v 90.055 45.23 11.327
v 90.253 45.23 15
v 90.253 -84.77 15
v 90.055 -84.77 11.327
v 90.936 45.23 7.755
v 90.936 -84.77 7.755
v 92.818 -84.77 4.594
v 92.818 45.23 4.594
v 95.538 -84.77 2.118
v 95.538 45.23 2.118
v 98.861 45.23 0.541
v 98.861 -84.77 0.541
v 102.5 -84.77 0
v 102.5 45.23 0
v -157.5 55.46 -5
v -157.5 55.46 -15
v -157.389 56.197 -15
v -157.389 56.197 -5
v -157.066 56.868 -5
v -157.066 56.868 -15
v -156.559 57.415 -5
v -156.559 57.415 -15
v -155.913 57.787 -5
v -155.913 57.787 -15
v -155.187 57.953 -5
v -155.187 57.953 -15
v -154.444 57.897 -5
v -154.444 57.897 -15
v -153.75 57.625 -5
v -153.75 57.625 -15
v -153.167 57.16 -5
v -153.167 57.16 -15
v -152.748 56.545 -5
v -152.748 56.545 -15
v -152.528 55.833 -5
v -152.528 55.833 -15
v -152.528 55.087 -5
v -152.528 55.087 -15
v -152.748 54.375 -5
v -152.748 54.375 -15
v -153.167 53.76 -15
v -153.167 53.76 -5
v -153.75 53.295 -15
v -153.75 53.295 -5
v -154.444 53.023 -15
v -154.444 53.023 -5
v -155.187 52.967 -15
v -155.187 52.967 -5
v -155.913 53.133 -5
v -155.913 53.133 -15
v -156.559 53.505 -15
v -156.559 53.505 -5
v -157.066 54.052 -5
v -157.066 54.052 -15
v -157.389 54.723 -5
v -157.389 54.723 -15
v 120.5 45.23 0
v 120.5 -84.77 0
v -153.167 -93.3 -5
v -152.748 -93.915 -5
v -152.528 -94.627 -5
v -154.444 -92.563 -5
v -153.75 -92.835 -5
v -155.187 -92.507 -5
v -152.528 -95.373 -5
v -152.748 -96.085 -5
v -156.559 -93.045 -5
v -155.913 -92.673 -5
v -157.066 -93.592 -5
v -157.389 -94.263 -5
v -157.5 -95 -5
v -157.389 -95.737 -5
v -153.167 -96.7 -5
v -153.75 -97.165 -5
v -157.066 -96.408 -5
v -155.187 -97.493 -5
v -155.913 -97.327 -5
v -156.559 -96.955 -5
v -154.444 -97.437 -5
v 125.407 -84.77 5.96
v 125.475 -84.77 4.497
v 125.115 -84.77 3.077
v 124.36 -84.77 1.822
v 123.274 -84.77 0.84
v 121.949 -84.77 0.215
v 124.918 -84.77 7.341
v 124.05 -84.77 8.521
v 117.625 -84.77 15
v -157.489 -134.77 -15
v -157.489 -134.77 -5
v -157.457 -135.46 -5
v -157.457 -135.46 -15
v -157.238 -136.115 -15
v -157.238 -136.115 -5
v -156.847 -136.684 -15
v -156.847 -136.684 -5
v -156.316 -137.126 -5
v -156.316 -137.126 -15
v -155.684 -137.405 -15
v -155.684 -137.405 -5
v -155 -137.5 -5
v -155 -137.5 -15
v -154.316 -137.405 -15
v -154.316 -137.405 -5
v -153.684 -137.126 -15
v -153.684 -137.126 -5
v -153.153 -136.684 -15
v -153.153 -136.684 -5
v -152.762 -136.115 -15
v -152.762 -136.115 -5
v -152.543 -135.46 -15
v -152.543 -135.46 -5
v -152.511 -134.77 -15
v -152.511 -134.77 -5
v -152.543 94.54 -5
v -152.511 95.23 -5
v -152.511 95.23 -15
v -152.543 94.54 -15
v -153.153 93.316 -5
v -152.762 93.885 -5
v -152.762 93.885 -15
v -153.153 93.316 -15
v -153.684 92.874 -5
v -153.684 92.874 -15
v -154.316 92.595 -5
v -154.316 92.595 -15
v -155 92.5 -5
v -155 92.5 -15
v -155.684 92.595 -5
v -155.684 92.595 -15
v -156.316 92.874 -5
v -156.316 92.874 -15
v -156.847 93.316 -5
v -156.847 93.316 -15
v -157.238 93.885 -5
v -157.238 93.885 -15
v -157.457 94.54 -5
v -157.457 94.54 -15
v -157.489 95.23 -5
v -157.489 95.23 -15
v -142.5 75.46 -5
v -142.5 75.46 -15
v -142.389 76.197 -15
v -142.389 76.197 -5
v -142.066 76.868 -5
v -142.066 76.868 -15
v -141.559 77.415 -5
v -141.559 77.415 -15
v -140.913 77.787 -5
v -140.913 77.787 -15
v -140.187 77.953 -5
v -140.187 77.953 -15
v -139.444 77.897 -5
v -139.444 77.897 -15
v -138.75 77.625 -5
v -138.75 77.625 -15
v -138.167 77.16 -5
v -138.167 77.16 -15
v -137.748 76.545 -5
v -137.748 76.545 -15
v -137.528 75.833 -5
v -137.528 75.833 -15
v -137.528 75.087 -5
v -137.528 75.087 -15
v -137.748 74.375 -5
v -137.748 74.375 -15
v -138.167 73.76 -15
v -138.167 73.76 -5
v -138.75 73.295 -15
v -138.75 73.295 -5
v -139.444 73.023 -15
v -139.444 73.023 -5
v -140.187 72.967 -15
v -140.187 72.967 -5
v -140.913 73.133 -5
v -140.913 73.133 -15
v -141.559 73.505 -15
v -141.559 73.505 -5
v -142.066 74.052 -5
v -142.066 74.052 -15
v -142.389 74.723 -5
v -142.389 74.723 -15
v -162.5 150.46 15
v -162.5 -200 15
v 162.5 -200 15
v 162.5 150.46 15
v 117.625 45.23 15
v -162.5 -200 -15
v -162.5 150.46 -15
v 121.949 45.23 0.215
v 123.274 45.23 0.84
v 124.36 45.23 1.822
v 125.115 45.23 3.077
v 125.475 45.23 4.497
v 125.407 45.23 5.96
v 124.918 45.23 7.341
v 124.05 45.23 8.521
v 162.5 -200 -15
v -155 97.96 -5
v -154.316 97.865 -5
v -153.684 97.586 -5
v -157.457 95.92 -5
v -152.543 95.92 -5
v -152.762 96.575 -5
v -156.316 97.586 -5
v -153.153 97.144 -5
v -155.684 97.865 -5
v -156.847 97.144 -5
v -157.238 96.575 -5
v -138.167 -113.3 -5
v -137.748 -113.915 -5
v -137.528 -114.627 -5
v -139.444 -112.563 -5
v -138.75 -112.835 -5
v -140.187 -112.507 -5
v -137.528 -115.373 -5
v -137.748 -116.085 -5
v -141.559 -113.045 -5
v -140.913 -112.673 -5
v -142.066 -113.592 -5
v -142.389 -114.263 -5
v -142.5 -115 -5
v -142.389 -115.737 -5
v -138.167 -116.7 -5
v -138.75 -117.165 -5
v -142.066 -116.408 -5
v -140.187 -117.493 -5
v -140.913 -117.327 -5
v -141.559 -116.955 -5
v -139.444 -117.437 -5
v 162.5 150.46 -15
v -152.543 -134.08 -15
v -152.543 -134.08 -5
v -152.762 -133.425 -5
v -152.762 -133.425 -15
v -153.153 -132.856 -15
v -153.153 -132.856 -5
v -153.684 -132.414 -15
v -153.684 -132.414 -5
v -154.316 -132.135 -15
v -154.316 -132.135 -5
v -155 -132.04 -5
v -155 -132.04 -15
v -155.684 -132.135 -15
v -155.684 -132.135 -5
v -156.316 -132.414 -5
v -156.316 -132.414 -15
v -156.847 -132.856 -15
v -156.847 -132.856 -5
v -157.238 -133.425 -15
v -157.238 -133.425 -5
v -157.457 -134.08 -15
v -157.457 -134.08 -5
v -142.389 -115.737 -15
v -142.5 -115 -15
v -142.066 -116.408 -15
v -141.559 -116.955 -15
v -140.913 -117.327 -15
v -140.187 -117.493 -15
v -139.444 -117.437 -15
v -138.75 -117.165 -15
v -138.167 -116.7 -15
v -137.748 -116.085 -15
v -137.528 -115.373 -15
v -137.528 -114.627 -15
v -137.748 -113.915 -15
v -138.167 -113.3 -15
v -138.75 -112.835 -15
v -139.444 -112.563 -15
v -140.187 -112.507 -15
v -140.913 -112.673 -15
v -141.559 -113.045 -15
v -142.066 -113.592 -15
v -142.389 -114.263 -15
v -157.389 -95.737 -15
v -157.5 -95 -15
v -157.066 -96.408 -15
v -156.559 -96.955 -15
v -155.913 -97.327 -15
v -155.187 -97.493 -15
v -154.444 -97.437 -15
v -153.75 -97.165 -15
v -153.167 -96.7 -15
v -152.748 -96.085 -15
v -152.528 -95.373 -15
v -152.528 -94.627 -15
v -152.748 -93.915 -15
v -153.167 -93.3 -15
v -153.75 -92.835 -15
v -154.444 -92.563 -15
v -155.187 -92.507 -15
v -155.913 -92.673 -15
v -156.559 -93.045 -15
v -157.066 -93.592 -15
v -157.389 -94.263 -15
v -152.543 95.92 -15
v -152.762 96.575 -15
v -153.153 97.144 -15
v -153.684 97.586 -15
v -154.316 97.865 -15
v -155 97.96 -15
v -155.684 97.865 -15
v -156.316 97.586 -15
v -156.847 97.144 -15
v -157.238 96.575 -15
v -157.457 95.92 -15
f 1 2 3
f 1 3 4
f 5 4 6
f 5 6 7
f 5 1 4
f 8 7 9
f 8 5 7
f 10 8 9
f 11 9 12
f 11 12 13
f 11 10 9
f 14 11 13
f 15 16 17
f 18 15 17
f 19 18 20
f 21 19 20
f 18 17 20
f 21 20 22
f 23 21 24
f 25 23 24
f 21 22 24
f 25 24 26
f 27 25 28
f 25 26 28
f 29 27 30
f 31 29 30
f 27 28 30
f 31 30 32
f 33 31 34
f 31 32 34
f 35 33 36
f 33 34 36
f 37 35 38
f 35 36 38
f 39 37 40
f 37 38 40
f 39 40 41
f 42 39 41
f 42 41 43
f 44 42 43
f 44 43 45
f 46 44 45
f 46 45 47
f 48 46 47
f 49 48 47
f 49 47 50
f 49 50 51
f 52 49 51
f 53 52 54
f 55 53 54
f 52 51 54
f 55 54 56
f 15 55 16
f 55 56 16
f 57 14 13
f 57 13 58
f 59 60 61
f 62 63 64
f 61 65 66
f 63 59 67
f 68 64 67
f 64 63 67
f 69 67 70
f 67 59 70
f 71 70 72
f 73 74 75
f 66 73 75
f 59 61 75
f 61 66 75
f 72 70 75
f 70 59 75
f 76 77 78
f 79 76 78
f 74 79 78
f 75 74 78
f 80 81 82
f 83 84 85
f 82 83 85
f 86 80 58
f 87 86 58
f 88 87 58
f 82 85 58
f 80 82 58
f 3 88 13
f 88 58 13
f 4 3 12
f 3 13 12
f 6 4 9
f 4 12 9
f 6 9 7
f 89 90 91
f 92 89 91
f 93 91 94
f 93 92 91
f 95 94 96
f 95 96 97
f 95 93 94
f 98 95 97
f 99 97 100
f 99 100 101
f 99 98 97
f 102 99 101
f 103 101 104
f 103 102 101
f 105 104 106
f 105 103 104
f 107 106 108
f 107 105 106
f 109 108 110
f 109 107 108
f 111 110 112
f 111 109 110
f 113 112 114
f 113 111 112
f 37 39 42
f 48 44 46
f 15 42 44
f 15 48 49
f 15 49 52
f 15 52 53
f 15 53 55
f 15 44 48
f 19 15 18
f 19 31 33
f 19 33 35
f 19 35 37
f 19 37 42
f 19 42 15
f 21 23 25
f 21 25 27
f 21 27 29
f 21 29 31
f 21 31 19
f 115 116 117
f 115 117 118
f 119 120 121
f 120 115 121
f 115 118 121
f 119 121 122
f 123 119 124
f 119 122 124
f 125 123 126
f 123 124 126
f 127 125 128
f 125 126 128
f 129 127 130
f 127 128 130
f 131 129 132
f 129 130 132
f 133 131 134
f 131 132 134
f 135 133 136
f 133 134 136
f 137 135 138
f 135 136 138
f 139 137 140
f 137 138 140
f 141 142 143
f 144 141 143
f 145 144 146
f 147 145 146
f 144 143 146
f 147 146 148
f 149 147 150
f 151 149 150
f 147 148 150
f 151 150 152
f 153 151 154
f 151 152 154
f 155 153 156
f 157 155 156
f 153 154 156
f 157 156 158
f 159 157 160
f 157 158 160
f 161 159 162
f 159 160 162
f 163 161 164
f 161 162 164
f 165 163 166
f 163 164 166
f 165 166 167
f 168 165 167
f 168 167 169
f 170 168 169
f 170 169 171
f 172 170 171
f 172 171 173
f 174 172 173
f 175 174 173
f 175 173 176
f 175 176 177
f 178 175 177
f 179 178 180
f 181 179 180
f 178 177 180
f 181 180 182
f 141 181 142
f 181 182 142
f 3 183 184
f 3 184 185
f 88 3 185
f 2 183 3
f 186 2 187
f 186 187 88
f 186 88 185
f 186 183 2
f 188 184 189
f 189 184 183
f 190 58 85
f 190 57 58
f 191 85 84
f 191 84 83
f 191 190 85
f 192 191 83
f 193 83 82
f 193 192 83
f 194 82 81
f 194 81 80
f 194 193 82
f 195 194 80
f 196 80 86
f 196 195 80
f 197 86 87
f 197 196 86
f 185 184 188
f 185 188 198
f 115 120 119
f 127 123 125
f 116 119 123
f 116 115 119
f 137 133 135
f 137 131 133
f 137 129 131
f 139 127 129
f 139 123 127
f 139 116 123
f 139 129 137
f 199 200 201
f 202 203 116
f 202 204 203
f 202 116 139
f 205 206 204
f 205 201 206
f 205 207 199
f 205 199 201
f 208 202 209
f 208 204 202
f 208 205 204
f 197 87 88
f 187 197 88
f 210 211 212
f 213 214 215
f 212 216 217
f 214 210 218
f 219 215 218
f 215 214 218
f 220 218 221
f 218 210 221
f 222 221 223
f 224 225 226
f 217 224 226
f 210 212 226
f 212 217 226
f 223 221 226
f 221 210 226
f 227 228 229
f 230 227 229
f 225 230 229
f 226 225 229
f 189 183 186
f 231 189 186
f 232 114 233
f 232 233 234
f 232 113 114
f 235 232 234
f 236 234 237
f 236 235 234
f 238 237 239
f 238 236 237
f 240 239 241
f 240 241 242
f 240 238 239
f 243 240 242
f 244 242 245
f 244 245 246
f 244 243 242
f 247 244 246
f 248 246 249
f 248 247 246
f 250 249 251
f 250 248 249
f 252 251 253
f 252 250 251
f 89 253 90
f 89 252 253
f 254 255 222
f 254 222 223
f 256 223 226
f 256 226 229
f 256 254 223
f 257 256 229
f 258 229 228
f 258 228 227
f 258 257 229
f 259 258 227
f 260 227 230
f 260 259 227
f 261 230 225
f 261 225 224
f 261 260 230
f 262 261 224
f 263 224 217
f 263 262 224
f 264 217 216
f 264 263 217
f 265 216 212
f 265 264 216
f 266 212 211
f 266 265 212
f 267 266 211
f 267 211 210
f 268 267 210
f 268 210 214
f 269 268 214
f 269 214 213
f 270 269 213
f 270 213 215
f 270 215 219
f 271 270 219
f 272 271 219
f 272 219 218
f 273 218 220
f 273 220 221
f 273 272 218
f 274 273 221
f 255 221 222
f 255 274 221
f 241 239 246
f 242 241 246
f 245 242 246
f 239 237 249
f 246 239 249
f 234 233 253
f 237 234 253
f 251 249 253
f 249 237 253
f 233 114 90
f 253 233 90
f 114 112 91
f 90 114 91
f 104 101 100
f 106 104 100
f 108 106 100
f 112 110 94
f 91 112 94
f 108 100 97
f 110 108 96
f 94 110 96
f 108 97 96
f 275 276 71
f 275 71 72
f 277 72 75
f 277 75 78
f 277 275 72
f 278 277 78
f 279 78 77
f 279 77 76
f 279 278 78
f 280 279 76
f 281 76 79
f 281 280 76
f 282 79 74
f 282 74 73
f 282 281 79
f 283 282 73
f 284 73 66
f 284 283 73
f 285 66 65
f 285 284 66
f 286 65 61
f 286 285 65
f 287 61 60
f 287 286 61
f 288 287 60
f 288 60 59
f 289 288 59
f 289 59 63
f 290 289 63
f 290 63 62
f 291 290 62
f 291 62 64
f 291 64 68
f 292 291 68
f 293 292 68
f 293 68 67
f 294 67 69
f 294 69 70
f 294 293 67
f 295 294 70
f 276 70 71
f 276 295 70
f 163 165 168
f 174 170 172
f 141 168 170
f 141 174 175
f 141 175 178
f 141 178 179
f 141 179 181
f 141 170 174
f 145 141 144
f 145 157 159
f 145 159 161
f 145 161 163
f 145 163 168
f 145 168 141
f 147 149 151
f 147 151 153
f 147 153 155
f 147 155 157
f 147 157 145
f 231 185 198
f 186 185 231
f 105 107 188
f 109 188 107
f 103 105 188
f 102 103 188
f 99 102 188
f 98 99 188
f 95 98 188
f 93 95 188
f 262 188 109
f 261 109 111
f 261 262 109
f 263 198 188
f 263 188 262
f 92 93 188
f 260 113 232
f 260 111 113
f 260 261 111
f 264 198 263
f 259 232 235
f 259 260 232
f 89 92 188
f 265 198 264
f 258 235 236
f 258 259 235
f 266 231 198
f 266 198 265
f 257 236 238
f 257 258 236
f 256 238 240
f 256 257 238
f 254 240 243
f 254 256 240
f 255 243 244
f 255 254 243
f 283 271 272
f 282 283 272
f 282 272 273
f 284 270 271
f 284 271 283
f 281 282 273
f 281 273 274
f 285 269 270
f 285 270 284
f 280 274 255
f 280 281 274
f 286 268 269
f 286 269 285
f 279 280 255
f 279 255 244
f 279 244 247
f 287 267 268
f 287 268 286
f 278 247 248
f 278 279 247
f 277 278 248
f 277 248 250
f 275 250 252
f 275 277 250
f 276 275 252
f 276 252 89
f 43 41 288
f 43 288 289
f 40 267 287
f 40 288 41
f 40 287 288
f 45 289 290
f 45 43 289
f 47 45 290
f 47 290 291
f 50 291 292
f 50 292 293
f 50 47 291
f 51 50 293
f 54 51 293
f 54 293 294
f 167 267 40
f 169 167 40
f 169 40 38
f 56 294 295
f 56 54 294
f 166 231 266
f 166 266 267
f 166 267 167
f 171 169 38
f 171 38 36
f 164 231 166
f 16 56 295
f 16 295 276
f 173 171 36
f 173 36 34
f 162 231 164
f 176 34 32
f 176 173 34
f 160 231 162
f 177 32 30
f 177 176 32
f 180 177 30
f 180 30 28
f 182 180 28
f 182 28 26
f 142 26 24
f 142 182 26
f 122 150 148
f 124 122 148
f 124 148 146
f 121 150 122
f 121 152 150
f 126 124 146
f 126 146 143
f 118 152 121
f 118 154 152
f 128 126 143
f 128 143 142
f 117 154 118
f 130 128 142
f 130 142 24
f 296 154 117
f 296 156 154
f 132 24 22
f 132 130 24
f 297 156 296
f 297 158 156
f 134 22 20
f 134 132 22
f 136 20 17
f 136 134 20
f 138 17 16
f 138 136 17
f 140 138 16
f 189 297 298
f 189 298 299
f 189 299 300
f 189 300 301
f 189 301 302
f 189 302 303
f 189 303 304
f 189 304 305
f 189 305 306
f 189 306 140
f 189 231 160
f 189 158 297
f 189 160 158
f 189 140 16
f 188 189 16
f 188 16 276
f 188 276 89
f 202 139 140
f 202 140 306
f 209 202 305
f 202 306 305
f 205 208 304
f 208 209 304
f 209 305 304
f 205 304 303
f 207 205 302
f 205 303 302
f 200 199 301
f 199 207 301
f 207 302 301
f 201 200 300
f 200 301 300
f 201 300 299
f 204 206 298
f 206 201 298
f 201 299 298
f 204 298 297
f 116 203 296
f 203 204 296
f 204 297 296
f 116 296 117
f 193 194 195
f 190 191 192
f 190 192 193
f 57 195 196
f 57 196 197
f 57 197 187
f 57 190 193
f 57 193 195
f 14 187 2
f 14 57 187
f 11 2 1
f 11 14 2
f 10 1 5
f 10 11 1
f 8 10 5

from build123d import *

# Parameters (mm, degrees)
SKETCH1_W               = 325
SKETCH1_H               = 400
BOSS_EXTRUDE1_DEPTH     = 15
SKETCH2_R               = 2.5
CUT_EXTRUDE1_DEPTH      = 10
SKETCH4_W               = 328.47257144
SKETCH4_H               = 49.54
CUT_EXTRUDE3_DEPTH      = 260.434481132
CUT_EXTRUDE4_DEPTH      = 65
MIRROR2_COPY_1_SKETCH_R = 2.5
MIRROR2_COPY_1_DEPTH    = 10
BOSS_EXTRUDE4_REACH     = 261.434
SKETCH6_R               = 2.5


with BuildPart() as part:
    # Sketch1 → Boss-Extrude1 (new, symmetric)
    with BuildSketch(Plane.XY):
        Rectangle(SKETCH1_W, SKETCH1_H)
    extrude(amount=BOSS_EXTRUDE1_DEPTH, both=True)

    # Sketch2 → Cut-Extrude1 (cut)
    with BuildSketch(Plane(origin=(0, 0, -15), x_dir=(-1, 0, 0), z_dir=(0, 0, -1))):
        with Locations((155, 135)):
            Circle(SKETCH2_R)
        with Locations((140, 115)):
            Circle(SKETCH2_R)
        with Locations((155, 95)):
            Circle(SKETCH2_R)
    cut_extrude1 = extrude(amount=-CUT_EXTRUDE1_DEPTH, mode=Mode.SUBTRACT)

    # Mirror1: Cut-Extrude1 across plane
    add(cut_extrude1.mirror(Plane.ZX), mode=Mode.SUBTRACT)

    # Sketch4 → Cut-Extrude3 (cut, through all)
    with BuildSketch(Plane.XY.offset(15)):
        with Locations((1.73628572, 175.23)):
            Rectangle(SKETCH4_W, SKETCH4_H)
    extrude(amount=-CUT_EXTRUDE3_DEPTH, mode=Mode.SUBTRACT)

    # Sketch5 → Cut-Extrude4 (cut, symmetric)
    with BuildSketch(Plane(origin=(0, -19.77, 0), x_dir=(1, 0, 0), z_dir=(0, 1, 0))):
        with BuildLine():
            Line((102.5, 0), (120.5, 0))
            ThreePointArc((120.5, 0), (125.115384615, -3.076923077), (124.050295858, -8.520710059))
            Line((124.050295858, -8.520710059), (111.375739645, -21.301775148))
            ThreePointArc((111.375739645, -21.301775148), (90.961538462, -17.307692308), (102.5, 0))
        make_face()
    extrude(amount=CUT_EXTRUDE4_DEPTH, both=True, mode=Mode.SUBTRACT)

    # Mirror2: Cut-Extrude1 across plane
    add(cut_extrude1.mirror(Plane.ZX.offset(-19.77)), mode=Mode.SUBTRACT)

    # Mirror2 copy 1 sketch → Mirror2 copy 1 (cut)
    with BuildSketch(Plane(origin=(0, -39.54, -15), x_dir=(-1, 0, 0), z_dir=(0, 0, -1))):
        with Locations((155, 135)):
            Circle(MIRROR2_COPY_1_SKETCH_R)
        with Locations((140, 115)):
            Circle(MIRROR2_COPY_1_SKETCH_R)
        with Locations((155, 95)):
            Circle(MIRROR2_COPY_1_SKETCH_R)
    extrude(amount=-MIRROR2_COPY_1_DEPTH, mode=Mode.SUBTRACT)

    # Sketch6 → Boss-Extrude4 (add, up to next)
    with BuildSketch(Plane(origin=(0, 0, -15), x_dir=(-1, 0, 0), z_dir=(0, 0, -1)), mode=Mode.PRIVATE) as boss_extrude4_sk1:
        with Locations((140, 115)):
            Circle(SKETCH6_R)
    boss_extrude4_tool1 = extrude(boss_extrude4_sk1.sketch, amount=-BOSS_EXTRUDE4_REACH, mode=Mode.PRIVATE) - part.part
    # Sketch6 → Boss-Extrude4 (add, up to next)
    with BuildSketch(Plane(origin=(0, 0, -15), x_dir=(-1, 0, 0), z_dir=(0, 0, -1)), mode=Mode.PRIVATE) as boss_extrude4_sk2:
        with Locations((155, 135)):
            Circle(SKETCH6_R)
    boss_extrude4_tool2 = extrude(boss_extrude4_sk2.sketch, amount=-BOSS_EXTRUDE4_REACH, mode=Mode.PRIVATE) - part.part
    # Sketch6 → Boss-Extrude4 (add, up to next)
    with BuildSketch(Plane(origin=(0, 0, -15), x_dir=(-1, 0, 0), z_dir=(0, 0, -1)), mode=Mode.PRIVATE) as boss_extrude4_sk3:
        with Locations((140, -154.54)):
            Circle(SKETCH6_R)
    boss_extrude4_tool3 = extrude(boss_extrude4_sk3.sketch, amount=-BOSS_EXTRUDE4_REACH, mode=Mode.PRIVATE) - part.part
    # Sketch6 → Boss-Extrude4 (add, up to next)
    with BuildSketch(Plane(origin=(0, 0, -15), x_dir=(-1, 0, 0), z_dir=(0, 0, -1)), mode=Mode.PRIVATE) as boss_extrude4_sk4:
        with Locations((155, -174.54)):
            Circle(SKETCH6_R)
    boss_extrude4_tool4 = extrude(boss_extrude4_sk4.sketch, amount=-BOSS_EXTRUDE4_REACH, mode=Mode.PRIVATE) - part.part
    add(boss_extrude4_tool1.solids().sort_by_distance((-140, 115, -15))[0])
    add(boss_extrude4_tool2.solids().sort_by_distance((-155, 135, -15))[0])
    add(boss_extrude4_tool3.solids().sort_by_distance((-140, -154.54, -15))[0])
    add(boss_extrude4_tool4.solids().sort_by_distance((-155, -174.54, -15))[0])


solid = part.part
